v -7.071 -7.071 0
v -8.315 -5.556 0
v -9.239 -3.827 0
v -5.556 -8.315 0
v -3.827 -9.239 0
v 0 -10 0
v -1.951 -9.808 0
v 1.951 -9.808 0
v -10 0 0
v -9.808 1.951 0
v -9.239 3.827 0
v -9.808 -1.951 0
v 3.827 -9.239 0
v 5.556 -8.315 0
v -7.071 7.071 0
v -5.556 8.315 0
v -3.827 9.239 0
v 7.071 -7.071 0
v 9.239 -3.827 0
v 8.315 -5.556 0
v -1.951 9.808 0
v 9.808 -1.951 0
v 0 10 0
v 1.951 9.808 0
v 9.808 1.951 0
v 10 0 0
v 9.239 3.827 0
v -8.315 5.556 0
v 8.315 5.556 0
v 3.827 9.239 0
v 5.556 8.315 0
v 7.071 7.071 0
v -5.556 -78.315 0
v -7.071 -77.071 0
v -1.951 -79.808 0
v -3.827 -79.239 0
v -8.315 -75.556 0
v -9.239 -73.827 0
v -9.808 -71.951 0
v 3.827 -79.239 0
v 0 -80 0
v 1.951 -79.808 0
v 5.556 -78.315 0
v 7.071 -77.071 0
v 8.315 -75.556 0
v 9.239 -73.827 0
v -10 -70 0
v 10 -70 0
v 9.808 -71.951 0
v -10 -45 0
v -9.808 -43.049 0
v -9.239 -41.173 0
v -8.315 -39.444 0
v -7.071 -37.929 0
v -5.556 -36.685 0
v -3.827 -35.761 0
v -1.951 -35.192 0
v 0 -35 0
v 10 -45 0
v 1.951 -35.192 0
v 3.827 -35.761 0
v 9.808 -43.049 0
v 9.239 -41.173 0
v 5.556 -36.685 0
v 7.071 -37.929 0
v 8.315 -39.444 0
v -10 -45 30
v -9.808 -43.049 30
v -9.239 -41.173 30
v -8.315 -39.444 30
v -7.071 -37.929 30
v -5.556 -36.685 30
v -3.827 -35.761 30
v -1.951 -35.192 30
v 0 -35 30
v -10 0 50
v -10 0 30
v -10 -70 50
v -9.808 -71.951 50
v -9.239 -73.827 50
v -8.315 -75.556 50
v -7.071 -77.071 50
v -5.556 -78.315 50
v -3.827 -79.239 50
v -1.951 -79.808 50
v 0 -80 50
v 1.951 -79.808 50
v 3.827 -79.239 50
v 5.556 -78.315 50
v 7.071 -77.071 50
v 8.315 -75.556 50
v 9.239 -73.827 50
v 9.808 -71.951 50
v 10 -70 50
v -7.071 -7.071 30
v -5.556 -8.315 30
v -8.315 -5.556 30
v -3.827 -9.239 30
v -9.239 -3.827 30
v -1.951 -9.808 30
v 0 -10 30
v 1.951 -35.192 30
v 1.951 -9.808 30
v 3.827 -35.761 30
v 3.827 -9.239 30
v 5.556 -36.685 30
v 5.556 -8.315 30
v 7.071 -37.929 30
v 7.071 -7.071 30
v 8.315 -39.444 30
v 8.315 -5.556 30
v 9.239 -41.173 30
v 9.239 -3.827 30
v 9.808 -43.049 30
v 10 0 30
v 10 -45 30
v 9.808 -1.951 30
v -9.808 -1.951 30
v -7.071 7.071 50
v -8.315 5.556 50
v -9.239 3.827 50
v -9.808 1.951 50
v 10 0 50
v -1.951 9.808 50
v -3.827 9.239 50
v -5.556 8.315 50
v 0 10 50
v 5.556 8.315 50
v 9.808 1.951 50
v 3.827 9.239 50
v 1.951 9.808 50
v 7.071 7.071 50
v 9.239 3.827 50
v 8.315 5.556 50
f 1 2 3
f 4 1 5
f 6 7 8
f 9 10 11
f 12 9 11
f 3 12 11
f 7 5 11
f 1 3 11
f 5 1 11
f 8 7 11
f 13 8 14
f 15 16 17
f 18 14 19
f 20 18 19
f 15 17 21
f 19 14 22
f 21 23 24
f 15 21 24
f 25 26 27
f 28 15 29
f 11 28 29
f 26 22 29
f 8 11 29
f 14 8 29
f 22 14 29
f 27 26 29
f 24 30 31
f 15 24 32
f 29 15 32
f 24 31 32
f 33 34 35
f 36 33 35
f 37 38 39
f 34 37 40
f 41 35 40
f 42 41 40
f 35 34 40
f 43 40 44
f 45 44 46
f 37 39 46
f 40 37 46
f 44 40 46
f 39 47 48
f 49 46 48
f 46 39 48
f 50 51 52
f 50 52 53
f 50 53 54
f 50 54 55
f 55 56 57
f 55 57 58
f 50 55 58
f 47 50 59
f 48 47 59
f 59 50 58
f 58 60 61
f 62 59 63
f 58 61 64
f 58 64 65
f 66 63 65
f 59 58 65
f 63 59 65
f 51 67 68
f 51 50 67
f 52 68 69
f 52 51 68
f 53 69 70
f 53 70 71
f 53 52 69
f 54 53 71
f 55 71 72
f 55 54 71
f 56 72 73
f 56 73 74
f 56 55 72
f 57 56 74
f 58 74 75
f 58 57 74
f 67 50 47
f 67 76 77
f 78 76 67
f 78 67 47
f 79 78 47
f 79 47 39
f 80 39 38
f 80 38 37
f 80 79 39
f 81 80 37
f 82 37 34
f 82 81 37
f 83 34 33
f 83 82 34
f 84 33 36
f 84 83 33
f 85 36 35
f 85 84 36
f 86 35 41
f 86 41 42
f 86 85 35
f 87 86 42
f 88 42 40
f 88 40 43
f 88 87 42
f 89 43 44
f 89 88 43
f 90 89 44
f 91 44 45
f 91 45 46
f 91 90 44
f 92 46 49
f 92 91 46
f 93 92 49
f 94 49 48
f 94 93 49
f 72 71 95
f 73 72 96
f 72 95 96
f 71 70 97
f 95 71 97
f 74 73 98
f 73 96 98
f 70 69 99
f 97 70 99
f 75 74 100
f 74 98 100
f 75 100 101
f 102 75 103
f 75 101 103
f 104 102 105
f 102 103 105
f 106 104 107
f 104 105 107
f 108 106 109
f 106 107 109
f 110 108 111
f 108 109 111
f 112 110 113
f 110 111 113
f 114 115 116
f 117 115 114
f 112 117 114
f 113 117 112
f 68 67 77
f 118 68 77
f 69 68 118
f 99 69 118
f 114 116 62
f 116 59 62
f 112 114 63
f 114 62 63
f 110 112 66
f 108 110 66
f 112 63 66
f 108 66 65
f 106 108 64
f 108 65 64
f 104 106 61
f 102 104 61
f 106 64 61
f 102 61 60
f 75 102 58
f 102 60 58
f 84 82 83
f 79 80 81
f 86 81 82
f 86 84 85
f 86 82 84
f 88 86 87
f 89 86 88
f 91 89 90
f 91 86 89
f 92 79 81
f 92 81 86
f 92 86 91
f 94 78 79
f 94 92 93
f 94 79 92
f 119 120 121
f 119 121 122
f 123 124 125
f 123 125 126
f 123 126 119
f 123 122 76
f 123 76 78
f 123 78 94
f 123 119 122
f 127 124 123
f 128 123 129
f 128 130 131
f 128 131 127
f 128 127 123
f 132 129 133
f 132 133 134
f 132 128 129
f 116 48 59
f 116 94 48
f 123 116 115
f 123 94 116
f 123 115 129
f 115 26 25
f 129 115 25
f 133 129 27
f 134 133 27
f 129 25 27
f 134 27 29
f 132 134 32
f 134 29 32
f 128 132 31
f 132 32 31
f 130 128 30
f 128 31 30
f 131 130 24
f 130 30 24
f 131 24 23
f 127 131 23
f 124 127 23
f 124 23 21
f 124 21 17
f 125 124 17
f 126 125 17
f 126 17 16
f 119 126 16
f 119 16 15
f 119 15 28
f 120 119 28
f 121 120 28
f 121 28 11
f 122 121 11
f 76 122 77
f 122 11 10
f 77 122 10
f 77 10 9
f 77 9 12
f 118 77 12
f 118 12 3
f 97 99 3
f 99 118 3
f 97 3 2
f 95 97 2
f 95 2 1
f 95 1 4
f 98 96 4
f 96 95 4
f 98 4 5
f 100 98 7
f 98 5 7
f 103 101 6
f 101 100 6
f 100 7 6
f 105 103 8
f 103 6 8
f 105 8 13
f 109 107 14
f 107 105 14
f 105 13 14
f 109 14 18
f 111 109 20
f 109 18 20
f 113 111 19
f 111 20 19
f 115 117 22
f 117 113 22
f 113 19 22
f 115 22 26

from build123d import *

# Parameters (mm, degrees)
F0_R     = 10
F1_DEPTH = 50
F3_DEPTH = 20
F5_DEPTH = 50
F6_R     = 9.99999


# Not quite as in the source:
# - a fillet or chamfer is up to 0.001 mm smaller than in the source, because OpenCascade refuses the exact size


with BuildPart() as f1:
    # F0 (on Top) → F1 (new body)
    with BuildSketch(Plane.XY):
        Circle(F0_R)
    extrude(amount=F1_DEPTH)

    # F2 (on face) → F3 (join)
    with BuildSketch(Plane.XY.offset(50)):
        with BuildLine():
            ThreePointArc((10, 0), (0, -10), (-10, 0))
            Line((-10, 0), (-10, -70))
            Line((-10, -70), (10, -70))
            Line((10, -70), (10, 0))
        make_face()
    extrude(amount=-F3_DEPTH)

    # F4 (on face) → F5 (join)
    with BuildSketch(Plane.XY.offset(50)):
        with BuildLine():
            Line((-10, -35), (-10, -70))
            ThreePointArc((-10, -70), (0, -60), (10, -70))
            Line((10, -70), (10, -35))
            Line((10, -35), (-10, -35))
        make_face()
        with BuildLine():
            ThreePointArc((10, -70), (0, -60), (-10, -70))
            Line((-10, -70), (10, -70))
        make_face()
        with BuildLine():
            Line((10, -70), (-10, -70))
            ThreePointArc((-10, -70), (0, -80), (10, -70))
        make_face()
    extrude(amount=-F5_DEPTH)

    # F6 (radius 10 in the source; OpenCascade refuses exactly that, so slightly less here)
    f6_edges = [f1.edges().sort_by_distance(p)[0] for p in [
        (10, -35, 15),
        (-10, -35, 15),
    ]]
    fillet(f6_edges, radius=F6_R)


solid = f1.part
